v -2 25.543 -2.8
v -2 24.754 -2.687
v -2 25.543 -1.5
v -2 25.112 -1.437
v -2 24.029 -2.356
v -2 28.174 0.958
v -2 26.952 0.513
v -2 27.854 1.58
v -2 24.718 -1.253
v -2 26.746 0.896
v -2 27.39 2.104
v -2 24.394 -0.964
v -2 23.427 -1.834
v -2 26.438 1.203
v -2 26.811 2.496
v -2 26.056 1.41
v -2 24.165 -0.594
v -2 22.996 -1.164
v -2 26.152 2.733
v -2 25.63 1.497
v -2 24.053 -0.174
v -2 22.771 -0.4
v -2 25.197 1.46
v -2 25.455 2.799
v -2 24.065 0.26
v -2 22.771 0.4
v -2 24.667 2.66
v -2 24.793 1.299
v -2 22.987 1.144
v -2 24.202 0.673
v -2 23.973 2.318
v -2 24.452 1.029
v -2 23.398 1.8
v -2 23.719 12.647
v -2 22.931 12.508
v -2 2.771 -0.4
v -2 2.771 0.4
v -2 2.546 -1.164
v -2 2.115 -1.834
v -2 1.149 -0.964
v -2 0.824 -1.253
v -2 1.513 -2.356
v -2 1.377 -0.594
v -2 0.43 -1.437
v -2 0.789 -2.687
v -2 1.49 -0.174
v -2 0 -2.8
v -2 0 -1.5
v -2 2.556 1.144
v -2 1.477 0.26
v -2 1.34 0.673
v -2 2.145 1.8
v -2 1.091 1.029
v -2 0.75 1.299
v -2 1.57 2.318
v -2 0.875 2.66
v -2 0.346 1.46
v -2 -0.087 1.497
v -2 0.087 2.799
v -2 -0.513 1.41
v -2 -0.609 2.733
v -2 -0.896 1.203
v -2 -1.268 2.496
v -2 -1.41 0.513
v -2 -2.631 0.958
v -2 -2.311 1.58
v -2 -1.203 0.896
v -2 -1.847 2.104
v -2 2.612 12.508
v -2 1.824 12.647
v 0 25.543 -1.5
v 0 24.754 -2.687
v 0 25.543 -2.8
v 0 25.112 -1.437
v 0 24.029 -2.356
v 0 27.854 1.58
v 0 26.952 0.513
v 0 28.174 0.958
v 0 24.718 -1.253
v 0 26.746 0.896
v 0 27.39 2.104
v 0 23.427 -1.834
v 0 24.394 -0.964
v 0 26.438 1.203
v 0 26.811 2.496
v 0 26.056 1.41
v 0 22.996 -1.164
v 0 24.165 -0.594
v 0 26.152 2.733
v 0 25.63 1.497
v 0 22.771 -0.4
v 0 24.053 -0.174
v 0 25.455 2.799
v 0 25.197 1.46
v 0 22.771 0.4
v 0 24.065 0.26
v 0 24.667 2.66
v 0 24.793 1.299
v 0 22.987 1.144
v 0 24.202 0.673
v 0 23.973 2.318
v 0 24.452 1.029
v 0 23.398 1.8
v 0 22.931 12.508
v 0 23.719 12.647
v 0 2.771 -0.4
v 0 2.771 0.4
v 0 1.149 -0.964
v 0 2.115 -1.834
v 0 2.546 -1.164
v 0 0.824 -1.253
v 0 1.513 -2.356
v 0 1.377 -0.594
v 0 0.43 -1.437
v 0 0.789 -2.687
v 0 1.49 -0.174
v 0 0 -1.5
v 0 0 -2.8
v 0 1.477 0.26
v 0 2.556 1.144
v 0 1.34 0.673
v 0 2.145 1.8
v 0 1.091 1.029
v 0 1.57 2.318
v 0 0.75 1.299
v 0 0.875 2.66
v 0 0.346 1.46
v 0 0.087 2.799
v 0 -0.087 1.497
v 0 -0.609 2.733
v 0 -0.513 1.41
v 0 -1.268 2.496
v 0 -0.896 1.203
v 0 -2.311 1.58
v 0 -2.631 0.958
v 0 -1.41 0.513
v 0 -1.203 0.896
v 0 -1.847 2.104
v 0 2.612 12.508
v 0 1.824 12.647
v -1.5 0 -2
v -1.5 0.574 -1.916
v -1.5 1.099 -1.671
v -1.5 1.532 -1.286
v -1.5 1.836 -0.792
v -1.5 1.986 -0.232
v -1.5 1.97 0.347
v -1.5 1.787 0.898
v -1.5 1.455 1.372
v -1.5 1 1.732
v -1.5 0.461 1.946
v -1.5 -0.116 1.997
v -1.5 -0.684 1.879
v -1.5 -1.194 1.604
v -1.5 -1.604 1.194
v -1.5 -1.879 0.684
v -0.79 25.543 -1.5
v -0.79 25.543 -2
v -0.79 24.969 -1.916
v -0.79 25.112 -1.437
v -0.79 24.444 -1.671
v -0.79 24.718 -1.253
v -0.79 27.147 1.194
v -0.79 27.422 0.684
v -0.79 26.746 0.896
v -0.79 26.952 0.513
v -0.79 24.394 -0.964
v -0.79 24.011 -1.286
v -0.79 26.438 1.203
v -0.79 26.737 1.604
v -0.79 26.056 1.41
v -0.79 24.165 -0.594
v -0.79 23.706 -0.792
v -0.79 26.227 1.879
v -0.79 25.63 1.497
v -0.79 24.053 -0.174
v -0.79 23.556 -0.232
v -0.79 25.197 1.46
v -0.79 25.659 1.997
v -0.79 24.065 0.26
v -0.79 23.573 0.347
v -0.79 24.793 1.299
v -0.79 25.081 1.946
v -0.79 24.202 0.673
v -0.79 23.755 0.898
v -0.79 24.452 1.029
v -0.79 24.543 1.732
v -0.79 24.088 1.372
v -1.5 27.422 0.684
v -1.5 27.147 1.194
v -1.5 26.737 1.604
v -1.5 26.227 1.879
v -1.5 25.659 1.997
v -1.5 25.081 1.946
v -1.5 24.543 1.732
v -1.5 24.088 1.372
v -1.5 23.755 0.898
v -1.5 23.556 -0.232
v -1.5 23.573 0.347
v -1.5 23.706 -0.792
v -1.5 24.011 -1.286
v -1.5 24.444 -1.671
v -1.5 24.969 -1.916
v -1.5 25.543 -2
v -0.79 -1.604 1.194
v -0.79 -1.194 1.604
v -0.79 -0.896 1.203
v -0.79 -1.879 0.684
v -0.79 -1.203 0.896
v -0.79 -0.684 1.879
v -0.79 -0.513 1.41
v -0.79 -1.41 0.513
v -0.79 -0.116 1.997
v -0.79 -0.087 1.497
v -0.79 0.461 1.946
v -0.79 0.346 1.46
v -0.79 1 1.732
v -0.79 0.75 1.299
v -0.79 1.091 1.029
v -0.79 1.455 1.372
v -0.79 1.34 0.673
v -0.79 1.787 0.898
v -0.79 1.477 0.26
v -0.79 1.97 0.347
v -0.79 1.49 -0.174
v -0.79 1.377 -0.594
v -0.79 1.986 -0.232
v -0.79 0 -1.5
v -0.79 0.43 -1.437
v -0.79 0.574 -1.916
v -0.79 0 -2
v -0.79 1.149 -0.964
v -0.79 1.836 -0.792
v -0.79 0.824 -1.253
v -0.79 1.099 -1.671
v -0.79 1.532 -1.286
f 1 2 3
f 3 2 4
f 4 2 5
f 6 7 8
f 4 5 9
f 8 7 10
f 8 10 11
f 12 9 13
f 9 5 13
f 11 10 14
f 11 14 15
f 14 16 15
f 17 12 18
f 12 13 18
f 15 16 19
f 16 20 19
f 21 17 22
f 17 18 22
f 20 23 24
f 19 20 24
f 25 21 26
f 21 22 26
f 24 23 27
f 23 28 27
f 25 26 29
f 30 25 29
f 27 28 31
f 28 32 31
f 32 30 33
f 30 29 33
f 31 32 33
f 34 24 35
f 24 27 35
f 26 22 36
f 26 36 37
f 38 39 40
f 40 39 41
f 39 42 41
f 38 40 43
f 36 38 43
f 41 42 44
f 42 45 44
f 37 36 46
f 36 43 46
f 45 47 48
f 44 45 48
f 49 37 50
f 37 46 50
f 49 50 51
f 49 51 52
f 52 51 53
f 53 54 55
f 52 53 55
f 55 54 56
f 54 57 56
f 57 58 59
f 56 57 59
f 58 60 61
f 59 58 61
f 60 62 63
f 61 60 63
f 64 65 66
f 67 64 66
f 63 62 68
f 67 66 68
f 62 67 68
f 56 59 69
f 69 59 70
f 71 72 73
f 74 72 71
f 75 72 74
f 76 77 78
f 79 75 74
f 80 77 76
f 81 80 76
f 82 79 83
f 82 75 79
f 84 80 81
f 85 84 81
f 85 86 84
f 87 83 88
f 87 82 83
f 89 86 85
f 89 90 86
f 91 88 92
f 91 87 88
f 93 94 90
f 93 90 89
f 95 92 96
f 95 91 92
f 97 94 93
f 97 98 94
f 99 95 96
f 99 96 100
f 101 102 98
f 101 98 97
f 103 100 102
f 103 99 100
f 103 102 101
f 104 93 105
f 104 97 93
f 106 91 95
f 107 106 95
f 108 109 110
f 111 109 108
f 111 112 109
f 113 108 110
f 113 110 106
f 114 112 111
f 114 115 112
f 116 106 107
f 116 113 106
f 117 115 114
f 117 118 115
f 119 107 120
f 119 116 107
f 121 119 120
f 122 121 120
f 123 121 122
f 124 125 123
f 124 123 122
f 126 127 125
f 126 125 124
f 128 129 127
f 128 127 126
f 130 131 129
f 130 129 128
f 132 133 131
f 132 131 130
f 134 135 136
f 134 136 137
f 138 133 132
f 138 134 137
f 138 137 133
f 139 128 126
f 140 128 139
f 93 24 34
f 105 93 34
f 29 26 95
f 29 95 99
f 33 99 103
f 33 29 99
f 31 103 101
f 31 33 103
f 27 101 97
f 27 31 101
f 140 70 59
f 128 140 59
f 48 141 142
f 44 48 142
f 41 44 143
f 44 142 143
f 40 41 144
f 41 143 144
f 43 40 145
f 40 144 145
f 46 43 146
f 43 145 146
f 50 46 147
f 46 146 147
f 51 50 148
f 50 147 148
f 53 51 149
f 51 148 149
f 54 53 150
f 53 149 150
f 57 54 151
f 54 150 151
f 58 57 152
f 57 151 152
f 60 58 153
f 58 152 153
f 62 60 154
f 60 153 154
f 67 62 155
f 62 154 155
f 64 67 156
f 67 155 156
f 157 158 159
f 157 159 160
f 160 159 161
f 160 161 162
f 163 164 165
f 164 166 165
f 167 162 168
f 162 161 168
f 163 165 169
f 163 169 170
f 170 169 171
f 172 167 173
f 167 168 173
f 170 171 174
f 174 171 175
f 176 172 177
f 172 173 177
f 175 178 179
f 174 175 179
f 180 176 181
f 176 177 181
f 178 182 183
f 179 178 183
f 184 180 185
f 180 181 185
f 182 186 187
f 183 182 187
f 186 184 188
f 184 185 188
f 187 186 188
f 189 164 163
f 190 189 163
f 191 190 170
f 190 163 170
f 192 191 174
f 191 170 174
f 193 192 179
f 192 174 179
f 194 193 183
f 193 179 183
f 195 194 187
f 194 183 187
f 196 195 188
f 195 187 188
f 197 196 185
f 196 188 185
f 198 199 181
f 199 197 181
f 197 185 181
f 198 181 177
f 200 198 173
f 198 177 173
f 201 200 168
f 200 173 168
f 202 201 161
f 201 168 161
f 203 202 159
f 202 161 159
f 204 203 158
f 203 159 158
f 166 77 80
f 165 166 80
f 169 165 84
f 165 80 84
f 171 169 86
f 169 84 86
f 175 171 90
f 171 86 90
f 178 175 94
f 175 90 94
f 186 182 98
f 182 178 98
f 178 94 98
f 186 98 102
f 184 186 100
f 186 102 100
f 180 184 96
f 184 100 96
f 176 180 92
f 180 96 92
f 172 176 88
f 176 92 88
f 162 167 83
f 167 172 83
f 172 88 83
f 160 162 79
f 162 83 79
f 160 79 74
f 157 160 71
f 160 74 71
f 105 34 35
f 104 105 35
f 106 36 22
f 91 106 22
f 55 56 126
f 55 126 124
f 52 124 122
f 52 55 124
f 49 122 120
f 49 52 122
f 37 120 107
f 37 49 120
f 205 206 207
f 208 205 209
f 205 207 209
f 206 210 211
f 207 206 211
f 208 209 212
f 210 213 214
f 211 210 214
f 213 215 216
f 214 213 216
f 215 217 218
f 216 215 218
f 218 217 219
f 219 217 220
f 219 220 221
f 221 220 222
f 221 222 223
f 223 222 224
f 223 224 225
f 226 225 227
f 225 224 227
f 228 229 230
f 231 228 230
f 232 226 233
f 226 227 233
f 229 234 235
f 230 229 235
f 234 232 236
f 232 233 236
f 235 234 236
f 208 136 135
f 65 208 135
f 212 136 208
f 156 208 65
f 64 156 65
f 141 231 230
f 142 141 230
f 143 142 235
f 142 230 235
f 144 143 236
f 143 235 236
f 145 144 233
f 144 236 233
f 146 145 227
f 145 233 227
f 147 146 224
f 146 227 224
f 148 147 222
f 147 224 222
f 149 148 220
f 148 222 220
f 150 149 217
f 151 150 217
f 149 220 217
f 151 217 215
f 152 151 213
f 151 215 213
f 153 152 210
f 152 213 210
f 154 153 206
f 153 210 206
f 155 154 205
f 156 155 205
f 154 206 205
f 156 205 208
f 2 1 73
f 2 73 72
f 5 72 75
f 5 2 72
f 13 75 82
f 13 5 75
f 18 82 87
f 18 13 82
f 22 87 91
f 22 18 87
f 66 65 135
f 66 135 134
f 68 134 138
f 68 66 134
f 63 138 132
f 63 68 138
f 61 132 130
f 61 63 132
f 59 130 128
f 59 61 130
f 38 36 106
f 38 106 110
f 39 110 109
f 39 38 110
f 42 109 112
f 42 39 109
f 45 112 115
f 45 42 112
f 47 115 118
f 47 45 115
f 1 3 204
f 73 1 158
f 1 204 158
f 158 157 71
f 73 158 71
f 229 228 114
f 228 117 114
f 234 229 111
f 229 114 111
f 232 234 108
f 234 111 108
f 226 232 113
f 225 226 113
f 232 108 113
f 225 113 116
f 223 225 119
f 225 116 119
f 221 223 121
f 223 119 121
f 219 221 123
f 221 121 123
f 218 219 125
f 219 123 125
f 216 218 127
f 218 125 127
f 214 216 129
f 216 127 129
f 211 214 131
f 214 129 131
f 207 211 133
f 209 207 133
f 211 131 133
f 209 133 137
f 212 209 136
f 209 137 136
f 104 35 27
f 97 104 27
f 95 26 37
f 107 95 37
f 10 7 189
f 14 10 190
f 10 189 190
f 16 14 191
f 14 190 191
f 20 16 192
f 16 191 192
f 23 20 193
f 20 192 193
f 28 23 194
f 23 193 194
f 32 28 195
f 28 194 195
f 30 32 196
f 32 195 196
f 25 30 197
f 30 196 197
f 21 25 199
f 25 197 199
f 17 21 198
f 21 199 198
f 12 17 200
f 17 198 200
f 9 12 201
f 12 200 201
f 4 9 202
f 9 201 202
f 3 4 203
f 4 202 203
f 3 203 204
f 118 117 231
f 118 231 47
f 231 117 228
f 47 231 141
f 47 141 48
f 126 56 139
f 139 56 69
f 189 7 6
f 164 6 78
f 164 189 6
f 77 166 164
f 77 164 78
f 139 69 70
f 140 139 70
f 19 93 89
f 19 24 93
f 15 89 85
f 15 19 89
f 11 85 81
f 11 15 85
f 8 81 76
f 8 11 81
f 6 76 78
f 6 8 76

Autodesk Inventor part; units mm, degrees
ref_plane "Work Plane1" through (-2, 20, -2.8) normal (0, -1, 0) x (1, 0, 0)
ref_plane "YZ Plane" through (0, 0, 0) normal (1, 0, 0) x (0, 1, 0)
ref_plane "XZ Plane" through (0, 0, 0) normal (0, 1, 0) x (-1, 0, 0)
sketch "Sketch1" plane through (0, 0, 0) normal (0, 1, 0) x (-1, 0, 0)
  line L0 (2, -1.5) -> (1.5, -2)
  line L1 (1.5, -2) -> (0.79, -2)
  line L2 (0.79, -2) -> (0.79, -1.5)
  line L3 (0.79, -1.5) -> (0, -1.5)
  line L4 (0, -1.5) -> (0, -2.8)
  line L5 (0, -2.8) -> (2, -2.8)
  line L6 (2, -2.8) -> (2, -1.5)
  line L7 (0, 0) -> (1.5115, 0)
  line L8 (2, -12.5) -> (2, -13.8)
  line L9 (2, -13.8) -> (0, -13.8)
  line L10 (0, -13.8) -> (0, -12.5)
  line L11 (0, -12.5) -> (0.5, -13)
  line L12 (0.5, -13) -> (1.5, -13)
  line L13 (1.5, -13) -> (2, -12.5)
  line L14 (0, -10) -> (1, -10)
  point P0 (1, -13)
  dimension "d0" = 0.5
  dimension "d1" = 45
  dimension "d2" = 0.8
  dimension "d3" = 0.71
  dimension "d5" = 2
  dimension "d6" = 1
  dimension "d7" = 0.8
  dimension "d8" = 0.5
  dimension "d9" = 10
  dimension "d10" = 3
revolve "Revolution1" add sketch "Sketch1" angle 250 about axis through (0, 0, 0) along (1, 0, 0) contours L6 L5 L4 L3 L2 L1 L0
sketch "Sketch3" plane through (-2, 0, -2.8) normal (-1, 0, 0) x (0, 0, 1)
  arc A0 (3.7577, -2.6311) -> (0, 0) centre (2.8, 0) ccw projected
  line L0 (2.4, 2.7713) -> (2.4, 12.7713)
  line L1 (2.4, 12.7713) -> (3.2, 12.7713)
  line L2 (3.2, 12.7713) -> (3.2, 2.7713)
  line L3 (5.4597, 0.8752) -> (15.3078, 2.6116)
  line L4 (15.3078, 2.6116) -> (15.4467, 1.8238)
  line L5 (15.4467, 1.8238) -> (5.5986, 0.0873)
  point P0 (2.8, 0)
  dimension "d31" = 0.8
  dimension "d32" = 10
  dimension "d33" = 80
  dimension "d14" = 0.81
  dimension "d16" = 2
  dimension "d18" = 2
  dimension "d19" = 0.81
  dimension "d20" = 70
  dimension "d27" = 1.356
  dimension "d28" = 0.8
extrude "Extrusion4" add sketch "Sketch3" against normal up to surface (2 mm away)
mirror "Mirror3" about plane through (-2, 12.7713, -0.4) normal (0, 1, 0) of "Extrusion4", "Revolution1"
properties part number "lens mounts"
